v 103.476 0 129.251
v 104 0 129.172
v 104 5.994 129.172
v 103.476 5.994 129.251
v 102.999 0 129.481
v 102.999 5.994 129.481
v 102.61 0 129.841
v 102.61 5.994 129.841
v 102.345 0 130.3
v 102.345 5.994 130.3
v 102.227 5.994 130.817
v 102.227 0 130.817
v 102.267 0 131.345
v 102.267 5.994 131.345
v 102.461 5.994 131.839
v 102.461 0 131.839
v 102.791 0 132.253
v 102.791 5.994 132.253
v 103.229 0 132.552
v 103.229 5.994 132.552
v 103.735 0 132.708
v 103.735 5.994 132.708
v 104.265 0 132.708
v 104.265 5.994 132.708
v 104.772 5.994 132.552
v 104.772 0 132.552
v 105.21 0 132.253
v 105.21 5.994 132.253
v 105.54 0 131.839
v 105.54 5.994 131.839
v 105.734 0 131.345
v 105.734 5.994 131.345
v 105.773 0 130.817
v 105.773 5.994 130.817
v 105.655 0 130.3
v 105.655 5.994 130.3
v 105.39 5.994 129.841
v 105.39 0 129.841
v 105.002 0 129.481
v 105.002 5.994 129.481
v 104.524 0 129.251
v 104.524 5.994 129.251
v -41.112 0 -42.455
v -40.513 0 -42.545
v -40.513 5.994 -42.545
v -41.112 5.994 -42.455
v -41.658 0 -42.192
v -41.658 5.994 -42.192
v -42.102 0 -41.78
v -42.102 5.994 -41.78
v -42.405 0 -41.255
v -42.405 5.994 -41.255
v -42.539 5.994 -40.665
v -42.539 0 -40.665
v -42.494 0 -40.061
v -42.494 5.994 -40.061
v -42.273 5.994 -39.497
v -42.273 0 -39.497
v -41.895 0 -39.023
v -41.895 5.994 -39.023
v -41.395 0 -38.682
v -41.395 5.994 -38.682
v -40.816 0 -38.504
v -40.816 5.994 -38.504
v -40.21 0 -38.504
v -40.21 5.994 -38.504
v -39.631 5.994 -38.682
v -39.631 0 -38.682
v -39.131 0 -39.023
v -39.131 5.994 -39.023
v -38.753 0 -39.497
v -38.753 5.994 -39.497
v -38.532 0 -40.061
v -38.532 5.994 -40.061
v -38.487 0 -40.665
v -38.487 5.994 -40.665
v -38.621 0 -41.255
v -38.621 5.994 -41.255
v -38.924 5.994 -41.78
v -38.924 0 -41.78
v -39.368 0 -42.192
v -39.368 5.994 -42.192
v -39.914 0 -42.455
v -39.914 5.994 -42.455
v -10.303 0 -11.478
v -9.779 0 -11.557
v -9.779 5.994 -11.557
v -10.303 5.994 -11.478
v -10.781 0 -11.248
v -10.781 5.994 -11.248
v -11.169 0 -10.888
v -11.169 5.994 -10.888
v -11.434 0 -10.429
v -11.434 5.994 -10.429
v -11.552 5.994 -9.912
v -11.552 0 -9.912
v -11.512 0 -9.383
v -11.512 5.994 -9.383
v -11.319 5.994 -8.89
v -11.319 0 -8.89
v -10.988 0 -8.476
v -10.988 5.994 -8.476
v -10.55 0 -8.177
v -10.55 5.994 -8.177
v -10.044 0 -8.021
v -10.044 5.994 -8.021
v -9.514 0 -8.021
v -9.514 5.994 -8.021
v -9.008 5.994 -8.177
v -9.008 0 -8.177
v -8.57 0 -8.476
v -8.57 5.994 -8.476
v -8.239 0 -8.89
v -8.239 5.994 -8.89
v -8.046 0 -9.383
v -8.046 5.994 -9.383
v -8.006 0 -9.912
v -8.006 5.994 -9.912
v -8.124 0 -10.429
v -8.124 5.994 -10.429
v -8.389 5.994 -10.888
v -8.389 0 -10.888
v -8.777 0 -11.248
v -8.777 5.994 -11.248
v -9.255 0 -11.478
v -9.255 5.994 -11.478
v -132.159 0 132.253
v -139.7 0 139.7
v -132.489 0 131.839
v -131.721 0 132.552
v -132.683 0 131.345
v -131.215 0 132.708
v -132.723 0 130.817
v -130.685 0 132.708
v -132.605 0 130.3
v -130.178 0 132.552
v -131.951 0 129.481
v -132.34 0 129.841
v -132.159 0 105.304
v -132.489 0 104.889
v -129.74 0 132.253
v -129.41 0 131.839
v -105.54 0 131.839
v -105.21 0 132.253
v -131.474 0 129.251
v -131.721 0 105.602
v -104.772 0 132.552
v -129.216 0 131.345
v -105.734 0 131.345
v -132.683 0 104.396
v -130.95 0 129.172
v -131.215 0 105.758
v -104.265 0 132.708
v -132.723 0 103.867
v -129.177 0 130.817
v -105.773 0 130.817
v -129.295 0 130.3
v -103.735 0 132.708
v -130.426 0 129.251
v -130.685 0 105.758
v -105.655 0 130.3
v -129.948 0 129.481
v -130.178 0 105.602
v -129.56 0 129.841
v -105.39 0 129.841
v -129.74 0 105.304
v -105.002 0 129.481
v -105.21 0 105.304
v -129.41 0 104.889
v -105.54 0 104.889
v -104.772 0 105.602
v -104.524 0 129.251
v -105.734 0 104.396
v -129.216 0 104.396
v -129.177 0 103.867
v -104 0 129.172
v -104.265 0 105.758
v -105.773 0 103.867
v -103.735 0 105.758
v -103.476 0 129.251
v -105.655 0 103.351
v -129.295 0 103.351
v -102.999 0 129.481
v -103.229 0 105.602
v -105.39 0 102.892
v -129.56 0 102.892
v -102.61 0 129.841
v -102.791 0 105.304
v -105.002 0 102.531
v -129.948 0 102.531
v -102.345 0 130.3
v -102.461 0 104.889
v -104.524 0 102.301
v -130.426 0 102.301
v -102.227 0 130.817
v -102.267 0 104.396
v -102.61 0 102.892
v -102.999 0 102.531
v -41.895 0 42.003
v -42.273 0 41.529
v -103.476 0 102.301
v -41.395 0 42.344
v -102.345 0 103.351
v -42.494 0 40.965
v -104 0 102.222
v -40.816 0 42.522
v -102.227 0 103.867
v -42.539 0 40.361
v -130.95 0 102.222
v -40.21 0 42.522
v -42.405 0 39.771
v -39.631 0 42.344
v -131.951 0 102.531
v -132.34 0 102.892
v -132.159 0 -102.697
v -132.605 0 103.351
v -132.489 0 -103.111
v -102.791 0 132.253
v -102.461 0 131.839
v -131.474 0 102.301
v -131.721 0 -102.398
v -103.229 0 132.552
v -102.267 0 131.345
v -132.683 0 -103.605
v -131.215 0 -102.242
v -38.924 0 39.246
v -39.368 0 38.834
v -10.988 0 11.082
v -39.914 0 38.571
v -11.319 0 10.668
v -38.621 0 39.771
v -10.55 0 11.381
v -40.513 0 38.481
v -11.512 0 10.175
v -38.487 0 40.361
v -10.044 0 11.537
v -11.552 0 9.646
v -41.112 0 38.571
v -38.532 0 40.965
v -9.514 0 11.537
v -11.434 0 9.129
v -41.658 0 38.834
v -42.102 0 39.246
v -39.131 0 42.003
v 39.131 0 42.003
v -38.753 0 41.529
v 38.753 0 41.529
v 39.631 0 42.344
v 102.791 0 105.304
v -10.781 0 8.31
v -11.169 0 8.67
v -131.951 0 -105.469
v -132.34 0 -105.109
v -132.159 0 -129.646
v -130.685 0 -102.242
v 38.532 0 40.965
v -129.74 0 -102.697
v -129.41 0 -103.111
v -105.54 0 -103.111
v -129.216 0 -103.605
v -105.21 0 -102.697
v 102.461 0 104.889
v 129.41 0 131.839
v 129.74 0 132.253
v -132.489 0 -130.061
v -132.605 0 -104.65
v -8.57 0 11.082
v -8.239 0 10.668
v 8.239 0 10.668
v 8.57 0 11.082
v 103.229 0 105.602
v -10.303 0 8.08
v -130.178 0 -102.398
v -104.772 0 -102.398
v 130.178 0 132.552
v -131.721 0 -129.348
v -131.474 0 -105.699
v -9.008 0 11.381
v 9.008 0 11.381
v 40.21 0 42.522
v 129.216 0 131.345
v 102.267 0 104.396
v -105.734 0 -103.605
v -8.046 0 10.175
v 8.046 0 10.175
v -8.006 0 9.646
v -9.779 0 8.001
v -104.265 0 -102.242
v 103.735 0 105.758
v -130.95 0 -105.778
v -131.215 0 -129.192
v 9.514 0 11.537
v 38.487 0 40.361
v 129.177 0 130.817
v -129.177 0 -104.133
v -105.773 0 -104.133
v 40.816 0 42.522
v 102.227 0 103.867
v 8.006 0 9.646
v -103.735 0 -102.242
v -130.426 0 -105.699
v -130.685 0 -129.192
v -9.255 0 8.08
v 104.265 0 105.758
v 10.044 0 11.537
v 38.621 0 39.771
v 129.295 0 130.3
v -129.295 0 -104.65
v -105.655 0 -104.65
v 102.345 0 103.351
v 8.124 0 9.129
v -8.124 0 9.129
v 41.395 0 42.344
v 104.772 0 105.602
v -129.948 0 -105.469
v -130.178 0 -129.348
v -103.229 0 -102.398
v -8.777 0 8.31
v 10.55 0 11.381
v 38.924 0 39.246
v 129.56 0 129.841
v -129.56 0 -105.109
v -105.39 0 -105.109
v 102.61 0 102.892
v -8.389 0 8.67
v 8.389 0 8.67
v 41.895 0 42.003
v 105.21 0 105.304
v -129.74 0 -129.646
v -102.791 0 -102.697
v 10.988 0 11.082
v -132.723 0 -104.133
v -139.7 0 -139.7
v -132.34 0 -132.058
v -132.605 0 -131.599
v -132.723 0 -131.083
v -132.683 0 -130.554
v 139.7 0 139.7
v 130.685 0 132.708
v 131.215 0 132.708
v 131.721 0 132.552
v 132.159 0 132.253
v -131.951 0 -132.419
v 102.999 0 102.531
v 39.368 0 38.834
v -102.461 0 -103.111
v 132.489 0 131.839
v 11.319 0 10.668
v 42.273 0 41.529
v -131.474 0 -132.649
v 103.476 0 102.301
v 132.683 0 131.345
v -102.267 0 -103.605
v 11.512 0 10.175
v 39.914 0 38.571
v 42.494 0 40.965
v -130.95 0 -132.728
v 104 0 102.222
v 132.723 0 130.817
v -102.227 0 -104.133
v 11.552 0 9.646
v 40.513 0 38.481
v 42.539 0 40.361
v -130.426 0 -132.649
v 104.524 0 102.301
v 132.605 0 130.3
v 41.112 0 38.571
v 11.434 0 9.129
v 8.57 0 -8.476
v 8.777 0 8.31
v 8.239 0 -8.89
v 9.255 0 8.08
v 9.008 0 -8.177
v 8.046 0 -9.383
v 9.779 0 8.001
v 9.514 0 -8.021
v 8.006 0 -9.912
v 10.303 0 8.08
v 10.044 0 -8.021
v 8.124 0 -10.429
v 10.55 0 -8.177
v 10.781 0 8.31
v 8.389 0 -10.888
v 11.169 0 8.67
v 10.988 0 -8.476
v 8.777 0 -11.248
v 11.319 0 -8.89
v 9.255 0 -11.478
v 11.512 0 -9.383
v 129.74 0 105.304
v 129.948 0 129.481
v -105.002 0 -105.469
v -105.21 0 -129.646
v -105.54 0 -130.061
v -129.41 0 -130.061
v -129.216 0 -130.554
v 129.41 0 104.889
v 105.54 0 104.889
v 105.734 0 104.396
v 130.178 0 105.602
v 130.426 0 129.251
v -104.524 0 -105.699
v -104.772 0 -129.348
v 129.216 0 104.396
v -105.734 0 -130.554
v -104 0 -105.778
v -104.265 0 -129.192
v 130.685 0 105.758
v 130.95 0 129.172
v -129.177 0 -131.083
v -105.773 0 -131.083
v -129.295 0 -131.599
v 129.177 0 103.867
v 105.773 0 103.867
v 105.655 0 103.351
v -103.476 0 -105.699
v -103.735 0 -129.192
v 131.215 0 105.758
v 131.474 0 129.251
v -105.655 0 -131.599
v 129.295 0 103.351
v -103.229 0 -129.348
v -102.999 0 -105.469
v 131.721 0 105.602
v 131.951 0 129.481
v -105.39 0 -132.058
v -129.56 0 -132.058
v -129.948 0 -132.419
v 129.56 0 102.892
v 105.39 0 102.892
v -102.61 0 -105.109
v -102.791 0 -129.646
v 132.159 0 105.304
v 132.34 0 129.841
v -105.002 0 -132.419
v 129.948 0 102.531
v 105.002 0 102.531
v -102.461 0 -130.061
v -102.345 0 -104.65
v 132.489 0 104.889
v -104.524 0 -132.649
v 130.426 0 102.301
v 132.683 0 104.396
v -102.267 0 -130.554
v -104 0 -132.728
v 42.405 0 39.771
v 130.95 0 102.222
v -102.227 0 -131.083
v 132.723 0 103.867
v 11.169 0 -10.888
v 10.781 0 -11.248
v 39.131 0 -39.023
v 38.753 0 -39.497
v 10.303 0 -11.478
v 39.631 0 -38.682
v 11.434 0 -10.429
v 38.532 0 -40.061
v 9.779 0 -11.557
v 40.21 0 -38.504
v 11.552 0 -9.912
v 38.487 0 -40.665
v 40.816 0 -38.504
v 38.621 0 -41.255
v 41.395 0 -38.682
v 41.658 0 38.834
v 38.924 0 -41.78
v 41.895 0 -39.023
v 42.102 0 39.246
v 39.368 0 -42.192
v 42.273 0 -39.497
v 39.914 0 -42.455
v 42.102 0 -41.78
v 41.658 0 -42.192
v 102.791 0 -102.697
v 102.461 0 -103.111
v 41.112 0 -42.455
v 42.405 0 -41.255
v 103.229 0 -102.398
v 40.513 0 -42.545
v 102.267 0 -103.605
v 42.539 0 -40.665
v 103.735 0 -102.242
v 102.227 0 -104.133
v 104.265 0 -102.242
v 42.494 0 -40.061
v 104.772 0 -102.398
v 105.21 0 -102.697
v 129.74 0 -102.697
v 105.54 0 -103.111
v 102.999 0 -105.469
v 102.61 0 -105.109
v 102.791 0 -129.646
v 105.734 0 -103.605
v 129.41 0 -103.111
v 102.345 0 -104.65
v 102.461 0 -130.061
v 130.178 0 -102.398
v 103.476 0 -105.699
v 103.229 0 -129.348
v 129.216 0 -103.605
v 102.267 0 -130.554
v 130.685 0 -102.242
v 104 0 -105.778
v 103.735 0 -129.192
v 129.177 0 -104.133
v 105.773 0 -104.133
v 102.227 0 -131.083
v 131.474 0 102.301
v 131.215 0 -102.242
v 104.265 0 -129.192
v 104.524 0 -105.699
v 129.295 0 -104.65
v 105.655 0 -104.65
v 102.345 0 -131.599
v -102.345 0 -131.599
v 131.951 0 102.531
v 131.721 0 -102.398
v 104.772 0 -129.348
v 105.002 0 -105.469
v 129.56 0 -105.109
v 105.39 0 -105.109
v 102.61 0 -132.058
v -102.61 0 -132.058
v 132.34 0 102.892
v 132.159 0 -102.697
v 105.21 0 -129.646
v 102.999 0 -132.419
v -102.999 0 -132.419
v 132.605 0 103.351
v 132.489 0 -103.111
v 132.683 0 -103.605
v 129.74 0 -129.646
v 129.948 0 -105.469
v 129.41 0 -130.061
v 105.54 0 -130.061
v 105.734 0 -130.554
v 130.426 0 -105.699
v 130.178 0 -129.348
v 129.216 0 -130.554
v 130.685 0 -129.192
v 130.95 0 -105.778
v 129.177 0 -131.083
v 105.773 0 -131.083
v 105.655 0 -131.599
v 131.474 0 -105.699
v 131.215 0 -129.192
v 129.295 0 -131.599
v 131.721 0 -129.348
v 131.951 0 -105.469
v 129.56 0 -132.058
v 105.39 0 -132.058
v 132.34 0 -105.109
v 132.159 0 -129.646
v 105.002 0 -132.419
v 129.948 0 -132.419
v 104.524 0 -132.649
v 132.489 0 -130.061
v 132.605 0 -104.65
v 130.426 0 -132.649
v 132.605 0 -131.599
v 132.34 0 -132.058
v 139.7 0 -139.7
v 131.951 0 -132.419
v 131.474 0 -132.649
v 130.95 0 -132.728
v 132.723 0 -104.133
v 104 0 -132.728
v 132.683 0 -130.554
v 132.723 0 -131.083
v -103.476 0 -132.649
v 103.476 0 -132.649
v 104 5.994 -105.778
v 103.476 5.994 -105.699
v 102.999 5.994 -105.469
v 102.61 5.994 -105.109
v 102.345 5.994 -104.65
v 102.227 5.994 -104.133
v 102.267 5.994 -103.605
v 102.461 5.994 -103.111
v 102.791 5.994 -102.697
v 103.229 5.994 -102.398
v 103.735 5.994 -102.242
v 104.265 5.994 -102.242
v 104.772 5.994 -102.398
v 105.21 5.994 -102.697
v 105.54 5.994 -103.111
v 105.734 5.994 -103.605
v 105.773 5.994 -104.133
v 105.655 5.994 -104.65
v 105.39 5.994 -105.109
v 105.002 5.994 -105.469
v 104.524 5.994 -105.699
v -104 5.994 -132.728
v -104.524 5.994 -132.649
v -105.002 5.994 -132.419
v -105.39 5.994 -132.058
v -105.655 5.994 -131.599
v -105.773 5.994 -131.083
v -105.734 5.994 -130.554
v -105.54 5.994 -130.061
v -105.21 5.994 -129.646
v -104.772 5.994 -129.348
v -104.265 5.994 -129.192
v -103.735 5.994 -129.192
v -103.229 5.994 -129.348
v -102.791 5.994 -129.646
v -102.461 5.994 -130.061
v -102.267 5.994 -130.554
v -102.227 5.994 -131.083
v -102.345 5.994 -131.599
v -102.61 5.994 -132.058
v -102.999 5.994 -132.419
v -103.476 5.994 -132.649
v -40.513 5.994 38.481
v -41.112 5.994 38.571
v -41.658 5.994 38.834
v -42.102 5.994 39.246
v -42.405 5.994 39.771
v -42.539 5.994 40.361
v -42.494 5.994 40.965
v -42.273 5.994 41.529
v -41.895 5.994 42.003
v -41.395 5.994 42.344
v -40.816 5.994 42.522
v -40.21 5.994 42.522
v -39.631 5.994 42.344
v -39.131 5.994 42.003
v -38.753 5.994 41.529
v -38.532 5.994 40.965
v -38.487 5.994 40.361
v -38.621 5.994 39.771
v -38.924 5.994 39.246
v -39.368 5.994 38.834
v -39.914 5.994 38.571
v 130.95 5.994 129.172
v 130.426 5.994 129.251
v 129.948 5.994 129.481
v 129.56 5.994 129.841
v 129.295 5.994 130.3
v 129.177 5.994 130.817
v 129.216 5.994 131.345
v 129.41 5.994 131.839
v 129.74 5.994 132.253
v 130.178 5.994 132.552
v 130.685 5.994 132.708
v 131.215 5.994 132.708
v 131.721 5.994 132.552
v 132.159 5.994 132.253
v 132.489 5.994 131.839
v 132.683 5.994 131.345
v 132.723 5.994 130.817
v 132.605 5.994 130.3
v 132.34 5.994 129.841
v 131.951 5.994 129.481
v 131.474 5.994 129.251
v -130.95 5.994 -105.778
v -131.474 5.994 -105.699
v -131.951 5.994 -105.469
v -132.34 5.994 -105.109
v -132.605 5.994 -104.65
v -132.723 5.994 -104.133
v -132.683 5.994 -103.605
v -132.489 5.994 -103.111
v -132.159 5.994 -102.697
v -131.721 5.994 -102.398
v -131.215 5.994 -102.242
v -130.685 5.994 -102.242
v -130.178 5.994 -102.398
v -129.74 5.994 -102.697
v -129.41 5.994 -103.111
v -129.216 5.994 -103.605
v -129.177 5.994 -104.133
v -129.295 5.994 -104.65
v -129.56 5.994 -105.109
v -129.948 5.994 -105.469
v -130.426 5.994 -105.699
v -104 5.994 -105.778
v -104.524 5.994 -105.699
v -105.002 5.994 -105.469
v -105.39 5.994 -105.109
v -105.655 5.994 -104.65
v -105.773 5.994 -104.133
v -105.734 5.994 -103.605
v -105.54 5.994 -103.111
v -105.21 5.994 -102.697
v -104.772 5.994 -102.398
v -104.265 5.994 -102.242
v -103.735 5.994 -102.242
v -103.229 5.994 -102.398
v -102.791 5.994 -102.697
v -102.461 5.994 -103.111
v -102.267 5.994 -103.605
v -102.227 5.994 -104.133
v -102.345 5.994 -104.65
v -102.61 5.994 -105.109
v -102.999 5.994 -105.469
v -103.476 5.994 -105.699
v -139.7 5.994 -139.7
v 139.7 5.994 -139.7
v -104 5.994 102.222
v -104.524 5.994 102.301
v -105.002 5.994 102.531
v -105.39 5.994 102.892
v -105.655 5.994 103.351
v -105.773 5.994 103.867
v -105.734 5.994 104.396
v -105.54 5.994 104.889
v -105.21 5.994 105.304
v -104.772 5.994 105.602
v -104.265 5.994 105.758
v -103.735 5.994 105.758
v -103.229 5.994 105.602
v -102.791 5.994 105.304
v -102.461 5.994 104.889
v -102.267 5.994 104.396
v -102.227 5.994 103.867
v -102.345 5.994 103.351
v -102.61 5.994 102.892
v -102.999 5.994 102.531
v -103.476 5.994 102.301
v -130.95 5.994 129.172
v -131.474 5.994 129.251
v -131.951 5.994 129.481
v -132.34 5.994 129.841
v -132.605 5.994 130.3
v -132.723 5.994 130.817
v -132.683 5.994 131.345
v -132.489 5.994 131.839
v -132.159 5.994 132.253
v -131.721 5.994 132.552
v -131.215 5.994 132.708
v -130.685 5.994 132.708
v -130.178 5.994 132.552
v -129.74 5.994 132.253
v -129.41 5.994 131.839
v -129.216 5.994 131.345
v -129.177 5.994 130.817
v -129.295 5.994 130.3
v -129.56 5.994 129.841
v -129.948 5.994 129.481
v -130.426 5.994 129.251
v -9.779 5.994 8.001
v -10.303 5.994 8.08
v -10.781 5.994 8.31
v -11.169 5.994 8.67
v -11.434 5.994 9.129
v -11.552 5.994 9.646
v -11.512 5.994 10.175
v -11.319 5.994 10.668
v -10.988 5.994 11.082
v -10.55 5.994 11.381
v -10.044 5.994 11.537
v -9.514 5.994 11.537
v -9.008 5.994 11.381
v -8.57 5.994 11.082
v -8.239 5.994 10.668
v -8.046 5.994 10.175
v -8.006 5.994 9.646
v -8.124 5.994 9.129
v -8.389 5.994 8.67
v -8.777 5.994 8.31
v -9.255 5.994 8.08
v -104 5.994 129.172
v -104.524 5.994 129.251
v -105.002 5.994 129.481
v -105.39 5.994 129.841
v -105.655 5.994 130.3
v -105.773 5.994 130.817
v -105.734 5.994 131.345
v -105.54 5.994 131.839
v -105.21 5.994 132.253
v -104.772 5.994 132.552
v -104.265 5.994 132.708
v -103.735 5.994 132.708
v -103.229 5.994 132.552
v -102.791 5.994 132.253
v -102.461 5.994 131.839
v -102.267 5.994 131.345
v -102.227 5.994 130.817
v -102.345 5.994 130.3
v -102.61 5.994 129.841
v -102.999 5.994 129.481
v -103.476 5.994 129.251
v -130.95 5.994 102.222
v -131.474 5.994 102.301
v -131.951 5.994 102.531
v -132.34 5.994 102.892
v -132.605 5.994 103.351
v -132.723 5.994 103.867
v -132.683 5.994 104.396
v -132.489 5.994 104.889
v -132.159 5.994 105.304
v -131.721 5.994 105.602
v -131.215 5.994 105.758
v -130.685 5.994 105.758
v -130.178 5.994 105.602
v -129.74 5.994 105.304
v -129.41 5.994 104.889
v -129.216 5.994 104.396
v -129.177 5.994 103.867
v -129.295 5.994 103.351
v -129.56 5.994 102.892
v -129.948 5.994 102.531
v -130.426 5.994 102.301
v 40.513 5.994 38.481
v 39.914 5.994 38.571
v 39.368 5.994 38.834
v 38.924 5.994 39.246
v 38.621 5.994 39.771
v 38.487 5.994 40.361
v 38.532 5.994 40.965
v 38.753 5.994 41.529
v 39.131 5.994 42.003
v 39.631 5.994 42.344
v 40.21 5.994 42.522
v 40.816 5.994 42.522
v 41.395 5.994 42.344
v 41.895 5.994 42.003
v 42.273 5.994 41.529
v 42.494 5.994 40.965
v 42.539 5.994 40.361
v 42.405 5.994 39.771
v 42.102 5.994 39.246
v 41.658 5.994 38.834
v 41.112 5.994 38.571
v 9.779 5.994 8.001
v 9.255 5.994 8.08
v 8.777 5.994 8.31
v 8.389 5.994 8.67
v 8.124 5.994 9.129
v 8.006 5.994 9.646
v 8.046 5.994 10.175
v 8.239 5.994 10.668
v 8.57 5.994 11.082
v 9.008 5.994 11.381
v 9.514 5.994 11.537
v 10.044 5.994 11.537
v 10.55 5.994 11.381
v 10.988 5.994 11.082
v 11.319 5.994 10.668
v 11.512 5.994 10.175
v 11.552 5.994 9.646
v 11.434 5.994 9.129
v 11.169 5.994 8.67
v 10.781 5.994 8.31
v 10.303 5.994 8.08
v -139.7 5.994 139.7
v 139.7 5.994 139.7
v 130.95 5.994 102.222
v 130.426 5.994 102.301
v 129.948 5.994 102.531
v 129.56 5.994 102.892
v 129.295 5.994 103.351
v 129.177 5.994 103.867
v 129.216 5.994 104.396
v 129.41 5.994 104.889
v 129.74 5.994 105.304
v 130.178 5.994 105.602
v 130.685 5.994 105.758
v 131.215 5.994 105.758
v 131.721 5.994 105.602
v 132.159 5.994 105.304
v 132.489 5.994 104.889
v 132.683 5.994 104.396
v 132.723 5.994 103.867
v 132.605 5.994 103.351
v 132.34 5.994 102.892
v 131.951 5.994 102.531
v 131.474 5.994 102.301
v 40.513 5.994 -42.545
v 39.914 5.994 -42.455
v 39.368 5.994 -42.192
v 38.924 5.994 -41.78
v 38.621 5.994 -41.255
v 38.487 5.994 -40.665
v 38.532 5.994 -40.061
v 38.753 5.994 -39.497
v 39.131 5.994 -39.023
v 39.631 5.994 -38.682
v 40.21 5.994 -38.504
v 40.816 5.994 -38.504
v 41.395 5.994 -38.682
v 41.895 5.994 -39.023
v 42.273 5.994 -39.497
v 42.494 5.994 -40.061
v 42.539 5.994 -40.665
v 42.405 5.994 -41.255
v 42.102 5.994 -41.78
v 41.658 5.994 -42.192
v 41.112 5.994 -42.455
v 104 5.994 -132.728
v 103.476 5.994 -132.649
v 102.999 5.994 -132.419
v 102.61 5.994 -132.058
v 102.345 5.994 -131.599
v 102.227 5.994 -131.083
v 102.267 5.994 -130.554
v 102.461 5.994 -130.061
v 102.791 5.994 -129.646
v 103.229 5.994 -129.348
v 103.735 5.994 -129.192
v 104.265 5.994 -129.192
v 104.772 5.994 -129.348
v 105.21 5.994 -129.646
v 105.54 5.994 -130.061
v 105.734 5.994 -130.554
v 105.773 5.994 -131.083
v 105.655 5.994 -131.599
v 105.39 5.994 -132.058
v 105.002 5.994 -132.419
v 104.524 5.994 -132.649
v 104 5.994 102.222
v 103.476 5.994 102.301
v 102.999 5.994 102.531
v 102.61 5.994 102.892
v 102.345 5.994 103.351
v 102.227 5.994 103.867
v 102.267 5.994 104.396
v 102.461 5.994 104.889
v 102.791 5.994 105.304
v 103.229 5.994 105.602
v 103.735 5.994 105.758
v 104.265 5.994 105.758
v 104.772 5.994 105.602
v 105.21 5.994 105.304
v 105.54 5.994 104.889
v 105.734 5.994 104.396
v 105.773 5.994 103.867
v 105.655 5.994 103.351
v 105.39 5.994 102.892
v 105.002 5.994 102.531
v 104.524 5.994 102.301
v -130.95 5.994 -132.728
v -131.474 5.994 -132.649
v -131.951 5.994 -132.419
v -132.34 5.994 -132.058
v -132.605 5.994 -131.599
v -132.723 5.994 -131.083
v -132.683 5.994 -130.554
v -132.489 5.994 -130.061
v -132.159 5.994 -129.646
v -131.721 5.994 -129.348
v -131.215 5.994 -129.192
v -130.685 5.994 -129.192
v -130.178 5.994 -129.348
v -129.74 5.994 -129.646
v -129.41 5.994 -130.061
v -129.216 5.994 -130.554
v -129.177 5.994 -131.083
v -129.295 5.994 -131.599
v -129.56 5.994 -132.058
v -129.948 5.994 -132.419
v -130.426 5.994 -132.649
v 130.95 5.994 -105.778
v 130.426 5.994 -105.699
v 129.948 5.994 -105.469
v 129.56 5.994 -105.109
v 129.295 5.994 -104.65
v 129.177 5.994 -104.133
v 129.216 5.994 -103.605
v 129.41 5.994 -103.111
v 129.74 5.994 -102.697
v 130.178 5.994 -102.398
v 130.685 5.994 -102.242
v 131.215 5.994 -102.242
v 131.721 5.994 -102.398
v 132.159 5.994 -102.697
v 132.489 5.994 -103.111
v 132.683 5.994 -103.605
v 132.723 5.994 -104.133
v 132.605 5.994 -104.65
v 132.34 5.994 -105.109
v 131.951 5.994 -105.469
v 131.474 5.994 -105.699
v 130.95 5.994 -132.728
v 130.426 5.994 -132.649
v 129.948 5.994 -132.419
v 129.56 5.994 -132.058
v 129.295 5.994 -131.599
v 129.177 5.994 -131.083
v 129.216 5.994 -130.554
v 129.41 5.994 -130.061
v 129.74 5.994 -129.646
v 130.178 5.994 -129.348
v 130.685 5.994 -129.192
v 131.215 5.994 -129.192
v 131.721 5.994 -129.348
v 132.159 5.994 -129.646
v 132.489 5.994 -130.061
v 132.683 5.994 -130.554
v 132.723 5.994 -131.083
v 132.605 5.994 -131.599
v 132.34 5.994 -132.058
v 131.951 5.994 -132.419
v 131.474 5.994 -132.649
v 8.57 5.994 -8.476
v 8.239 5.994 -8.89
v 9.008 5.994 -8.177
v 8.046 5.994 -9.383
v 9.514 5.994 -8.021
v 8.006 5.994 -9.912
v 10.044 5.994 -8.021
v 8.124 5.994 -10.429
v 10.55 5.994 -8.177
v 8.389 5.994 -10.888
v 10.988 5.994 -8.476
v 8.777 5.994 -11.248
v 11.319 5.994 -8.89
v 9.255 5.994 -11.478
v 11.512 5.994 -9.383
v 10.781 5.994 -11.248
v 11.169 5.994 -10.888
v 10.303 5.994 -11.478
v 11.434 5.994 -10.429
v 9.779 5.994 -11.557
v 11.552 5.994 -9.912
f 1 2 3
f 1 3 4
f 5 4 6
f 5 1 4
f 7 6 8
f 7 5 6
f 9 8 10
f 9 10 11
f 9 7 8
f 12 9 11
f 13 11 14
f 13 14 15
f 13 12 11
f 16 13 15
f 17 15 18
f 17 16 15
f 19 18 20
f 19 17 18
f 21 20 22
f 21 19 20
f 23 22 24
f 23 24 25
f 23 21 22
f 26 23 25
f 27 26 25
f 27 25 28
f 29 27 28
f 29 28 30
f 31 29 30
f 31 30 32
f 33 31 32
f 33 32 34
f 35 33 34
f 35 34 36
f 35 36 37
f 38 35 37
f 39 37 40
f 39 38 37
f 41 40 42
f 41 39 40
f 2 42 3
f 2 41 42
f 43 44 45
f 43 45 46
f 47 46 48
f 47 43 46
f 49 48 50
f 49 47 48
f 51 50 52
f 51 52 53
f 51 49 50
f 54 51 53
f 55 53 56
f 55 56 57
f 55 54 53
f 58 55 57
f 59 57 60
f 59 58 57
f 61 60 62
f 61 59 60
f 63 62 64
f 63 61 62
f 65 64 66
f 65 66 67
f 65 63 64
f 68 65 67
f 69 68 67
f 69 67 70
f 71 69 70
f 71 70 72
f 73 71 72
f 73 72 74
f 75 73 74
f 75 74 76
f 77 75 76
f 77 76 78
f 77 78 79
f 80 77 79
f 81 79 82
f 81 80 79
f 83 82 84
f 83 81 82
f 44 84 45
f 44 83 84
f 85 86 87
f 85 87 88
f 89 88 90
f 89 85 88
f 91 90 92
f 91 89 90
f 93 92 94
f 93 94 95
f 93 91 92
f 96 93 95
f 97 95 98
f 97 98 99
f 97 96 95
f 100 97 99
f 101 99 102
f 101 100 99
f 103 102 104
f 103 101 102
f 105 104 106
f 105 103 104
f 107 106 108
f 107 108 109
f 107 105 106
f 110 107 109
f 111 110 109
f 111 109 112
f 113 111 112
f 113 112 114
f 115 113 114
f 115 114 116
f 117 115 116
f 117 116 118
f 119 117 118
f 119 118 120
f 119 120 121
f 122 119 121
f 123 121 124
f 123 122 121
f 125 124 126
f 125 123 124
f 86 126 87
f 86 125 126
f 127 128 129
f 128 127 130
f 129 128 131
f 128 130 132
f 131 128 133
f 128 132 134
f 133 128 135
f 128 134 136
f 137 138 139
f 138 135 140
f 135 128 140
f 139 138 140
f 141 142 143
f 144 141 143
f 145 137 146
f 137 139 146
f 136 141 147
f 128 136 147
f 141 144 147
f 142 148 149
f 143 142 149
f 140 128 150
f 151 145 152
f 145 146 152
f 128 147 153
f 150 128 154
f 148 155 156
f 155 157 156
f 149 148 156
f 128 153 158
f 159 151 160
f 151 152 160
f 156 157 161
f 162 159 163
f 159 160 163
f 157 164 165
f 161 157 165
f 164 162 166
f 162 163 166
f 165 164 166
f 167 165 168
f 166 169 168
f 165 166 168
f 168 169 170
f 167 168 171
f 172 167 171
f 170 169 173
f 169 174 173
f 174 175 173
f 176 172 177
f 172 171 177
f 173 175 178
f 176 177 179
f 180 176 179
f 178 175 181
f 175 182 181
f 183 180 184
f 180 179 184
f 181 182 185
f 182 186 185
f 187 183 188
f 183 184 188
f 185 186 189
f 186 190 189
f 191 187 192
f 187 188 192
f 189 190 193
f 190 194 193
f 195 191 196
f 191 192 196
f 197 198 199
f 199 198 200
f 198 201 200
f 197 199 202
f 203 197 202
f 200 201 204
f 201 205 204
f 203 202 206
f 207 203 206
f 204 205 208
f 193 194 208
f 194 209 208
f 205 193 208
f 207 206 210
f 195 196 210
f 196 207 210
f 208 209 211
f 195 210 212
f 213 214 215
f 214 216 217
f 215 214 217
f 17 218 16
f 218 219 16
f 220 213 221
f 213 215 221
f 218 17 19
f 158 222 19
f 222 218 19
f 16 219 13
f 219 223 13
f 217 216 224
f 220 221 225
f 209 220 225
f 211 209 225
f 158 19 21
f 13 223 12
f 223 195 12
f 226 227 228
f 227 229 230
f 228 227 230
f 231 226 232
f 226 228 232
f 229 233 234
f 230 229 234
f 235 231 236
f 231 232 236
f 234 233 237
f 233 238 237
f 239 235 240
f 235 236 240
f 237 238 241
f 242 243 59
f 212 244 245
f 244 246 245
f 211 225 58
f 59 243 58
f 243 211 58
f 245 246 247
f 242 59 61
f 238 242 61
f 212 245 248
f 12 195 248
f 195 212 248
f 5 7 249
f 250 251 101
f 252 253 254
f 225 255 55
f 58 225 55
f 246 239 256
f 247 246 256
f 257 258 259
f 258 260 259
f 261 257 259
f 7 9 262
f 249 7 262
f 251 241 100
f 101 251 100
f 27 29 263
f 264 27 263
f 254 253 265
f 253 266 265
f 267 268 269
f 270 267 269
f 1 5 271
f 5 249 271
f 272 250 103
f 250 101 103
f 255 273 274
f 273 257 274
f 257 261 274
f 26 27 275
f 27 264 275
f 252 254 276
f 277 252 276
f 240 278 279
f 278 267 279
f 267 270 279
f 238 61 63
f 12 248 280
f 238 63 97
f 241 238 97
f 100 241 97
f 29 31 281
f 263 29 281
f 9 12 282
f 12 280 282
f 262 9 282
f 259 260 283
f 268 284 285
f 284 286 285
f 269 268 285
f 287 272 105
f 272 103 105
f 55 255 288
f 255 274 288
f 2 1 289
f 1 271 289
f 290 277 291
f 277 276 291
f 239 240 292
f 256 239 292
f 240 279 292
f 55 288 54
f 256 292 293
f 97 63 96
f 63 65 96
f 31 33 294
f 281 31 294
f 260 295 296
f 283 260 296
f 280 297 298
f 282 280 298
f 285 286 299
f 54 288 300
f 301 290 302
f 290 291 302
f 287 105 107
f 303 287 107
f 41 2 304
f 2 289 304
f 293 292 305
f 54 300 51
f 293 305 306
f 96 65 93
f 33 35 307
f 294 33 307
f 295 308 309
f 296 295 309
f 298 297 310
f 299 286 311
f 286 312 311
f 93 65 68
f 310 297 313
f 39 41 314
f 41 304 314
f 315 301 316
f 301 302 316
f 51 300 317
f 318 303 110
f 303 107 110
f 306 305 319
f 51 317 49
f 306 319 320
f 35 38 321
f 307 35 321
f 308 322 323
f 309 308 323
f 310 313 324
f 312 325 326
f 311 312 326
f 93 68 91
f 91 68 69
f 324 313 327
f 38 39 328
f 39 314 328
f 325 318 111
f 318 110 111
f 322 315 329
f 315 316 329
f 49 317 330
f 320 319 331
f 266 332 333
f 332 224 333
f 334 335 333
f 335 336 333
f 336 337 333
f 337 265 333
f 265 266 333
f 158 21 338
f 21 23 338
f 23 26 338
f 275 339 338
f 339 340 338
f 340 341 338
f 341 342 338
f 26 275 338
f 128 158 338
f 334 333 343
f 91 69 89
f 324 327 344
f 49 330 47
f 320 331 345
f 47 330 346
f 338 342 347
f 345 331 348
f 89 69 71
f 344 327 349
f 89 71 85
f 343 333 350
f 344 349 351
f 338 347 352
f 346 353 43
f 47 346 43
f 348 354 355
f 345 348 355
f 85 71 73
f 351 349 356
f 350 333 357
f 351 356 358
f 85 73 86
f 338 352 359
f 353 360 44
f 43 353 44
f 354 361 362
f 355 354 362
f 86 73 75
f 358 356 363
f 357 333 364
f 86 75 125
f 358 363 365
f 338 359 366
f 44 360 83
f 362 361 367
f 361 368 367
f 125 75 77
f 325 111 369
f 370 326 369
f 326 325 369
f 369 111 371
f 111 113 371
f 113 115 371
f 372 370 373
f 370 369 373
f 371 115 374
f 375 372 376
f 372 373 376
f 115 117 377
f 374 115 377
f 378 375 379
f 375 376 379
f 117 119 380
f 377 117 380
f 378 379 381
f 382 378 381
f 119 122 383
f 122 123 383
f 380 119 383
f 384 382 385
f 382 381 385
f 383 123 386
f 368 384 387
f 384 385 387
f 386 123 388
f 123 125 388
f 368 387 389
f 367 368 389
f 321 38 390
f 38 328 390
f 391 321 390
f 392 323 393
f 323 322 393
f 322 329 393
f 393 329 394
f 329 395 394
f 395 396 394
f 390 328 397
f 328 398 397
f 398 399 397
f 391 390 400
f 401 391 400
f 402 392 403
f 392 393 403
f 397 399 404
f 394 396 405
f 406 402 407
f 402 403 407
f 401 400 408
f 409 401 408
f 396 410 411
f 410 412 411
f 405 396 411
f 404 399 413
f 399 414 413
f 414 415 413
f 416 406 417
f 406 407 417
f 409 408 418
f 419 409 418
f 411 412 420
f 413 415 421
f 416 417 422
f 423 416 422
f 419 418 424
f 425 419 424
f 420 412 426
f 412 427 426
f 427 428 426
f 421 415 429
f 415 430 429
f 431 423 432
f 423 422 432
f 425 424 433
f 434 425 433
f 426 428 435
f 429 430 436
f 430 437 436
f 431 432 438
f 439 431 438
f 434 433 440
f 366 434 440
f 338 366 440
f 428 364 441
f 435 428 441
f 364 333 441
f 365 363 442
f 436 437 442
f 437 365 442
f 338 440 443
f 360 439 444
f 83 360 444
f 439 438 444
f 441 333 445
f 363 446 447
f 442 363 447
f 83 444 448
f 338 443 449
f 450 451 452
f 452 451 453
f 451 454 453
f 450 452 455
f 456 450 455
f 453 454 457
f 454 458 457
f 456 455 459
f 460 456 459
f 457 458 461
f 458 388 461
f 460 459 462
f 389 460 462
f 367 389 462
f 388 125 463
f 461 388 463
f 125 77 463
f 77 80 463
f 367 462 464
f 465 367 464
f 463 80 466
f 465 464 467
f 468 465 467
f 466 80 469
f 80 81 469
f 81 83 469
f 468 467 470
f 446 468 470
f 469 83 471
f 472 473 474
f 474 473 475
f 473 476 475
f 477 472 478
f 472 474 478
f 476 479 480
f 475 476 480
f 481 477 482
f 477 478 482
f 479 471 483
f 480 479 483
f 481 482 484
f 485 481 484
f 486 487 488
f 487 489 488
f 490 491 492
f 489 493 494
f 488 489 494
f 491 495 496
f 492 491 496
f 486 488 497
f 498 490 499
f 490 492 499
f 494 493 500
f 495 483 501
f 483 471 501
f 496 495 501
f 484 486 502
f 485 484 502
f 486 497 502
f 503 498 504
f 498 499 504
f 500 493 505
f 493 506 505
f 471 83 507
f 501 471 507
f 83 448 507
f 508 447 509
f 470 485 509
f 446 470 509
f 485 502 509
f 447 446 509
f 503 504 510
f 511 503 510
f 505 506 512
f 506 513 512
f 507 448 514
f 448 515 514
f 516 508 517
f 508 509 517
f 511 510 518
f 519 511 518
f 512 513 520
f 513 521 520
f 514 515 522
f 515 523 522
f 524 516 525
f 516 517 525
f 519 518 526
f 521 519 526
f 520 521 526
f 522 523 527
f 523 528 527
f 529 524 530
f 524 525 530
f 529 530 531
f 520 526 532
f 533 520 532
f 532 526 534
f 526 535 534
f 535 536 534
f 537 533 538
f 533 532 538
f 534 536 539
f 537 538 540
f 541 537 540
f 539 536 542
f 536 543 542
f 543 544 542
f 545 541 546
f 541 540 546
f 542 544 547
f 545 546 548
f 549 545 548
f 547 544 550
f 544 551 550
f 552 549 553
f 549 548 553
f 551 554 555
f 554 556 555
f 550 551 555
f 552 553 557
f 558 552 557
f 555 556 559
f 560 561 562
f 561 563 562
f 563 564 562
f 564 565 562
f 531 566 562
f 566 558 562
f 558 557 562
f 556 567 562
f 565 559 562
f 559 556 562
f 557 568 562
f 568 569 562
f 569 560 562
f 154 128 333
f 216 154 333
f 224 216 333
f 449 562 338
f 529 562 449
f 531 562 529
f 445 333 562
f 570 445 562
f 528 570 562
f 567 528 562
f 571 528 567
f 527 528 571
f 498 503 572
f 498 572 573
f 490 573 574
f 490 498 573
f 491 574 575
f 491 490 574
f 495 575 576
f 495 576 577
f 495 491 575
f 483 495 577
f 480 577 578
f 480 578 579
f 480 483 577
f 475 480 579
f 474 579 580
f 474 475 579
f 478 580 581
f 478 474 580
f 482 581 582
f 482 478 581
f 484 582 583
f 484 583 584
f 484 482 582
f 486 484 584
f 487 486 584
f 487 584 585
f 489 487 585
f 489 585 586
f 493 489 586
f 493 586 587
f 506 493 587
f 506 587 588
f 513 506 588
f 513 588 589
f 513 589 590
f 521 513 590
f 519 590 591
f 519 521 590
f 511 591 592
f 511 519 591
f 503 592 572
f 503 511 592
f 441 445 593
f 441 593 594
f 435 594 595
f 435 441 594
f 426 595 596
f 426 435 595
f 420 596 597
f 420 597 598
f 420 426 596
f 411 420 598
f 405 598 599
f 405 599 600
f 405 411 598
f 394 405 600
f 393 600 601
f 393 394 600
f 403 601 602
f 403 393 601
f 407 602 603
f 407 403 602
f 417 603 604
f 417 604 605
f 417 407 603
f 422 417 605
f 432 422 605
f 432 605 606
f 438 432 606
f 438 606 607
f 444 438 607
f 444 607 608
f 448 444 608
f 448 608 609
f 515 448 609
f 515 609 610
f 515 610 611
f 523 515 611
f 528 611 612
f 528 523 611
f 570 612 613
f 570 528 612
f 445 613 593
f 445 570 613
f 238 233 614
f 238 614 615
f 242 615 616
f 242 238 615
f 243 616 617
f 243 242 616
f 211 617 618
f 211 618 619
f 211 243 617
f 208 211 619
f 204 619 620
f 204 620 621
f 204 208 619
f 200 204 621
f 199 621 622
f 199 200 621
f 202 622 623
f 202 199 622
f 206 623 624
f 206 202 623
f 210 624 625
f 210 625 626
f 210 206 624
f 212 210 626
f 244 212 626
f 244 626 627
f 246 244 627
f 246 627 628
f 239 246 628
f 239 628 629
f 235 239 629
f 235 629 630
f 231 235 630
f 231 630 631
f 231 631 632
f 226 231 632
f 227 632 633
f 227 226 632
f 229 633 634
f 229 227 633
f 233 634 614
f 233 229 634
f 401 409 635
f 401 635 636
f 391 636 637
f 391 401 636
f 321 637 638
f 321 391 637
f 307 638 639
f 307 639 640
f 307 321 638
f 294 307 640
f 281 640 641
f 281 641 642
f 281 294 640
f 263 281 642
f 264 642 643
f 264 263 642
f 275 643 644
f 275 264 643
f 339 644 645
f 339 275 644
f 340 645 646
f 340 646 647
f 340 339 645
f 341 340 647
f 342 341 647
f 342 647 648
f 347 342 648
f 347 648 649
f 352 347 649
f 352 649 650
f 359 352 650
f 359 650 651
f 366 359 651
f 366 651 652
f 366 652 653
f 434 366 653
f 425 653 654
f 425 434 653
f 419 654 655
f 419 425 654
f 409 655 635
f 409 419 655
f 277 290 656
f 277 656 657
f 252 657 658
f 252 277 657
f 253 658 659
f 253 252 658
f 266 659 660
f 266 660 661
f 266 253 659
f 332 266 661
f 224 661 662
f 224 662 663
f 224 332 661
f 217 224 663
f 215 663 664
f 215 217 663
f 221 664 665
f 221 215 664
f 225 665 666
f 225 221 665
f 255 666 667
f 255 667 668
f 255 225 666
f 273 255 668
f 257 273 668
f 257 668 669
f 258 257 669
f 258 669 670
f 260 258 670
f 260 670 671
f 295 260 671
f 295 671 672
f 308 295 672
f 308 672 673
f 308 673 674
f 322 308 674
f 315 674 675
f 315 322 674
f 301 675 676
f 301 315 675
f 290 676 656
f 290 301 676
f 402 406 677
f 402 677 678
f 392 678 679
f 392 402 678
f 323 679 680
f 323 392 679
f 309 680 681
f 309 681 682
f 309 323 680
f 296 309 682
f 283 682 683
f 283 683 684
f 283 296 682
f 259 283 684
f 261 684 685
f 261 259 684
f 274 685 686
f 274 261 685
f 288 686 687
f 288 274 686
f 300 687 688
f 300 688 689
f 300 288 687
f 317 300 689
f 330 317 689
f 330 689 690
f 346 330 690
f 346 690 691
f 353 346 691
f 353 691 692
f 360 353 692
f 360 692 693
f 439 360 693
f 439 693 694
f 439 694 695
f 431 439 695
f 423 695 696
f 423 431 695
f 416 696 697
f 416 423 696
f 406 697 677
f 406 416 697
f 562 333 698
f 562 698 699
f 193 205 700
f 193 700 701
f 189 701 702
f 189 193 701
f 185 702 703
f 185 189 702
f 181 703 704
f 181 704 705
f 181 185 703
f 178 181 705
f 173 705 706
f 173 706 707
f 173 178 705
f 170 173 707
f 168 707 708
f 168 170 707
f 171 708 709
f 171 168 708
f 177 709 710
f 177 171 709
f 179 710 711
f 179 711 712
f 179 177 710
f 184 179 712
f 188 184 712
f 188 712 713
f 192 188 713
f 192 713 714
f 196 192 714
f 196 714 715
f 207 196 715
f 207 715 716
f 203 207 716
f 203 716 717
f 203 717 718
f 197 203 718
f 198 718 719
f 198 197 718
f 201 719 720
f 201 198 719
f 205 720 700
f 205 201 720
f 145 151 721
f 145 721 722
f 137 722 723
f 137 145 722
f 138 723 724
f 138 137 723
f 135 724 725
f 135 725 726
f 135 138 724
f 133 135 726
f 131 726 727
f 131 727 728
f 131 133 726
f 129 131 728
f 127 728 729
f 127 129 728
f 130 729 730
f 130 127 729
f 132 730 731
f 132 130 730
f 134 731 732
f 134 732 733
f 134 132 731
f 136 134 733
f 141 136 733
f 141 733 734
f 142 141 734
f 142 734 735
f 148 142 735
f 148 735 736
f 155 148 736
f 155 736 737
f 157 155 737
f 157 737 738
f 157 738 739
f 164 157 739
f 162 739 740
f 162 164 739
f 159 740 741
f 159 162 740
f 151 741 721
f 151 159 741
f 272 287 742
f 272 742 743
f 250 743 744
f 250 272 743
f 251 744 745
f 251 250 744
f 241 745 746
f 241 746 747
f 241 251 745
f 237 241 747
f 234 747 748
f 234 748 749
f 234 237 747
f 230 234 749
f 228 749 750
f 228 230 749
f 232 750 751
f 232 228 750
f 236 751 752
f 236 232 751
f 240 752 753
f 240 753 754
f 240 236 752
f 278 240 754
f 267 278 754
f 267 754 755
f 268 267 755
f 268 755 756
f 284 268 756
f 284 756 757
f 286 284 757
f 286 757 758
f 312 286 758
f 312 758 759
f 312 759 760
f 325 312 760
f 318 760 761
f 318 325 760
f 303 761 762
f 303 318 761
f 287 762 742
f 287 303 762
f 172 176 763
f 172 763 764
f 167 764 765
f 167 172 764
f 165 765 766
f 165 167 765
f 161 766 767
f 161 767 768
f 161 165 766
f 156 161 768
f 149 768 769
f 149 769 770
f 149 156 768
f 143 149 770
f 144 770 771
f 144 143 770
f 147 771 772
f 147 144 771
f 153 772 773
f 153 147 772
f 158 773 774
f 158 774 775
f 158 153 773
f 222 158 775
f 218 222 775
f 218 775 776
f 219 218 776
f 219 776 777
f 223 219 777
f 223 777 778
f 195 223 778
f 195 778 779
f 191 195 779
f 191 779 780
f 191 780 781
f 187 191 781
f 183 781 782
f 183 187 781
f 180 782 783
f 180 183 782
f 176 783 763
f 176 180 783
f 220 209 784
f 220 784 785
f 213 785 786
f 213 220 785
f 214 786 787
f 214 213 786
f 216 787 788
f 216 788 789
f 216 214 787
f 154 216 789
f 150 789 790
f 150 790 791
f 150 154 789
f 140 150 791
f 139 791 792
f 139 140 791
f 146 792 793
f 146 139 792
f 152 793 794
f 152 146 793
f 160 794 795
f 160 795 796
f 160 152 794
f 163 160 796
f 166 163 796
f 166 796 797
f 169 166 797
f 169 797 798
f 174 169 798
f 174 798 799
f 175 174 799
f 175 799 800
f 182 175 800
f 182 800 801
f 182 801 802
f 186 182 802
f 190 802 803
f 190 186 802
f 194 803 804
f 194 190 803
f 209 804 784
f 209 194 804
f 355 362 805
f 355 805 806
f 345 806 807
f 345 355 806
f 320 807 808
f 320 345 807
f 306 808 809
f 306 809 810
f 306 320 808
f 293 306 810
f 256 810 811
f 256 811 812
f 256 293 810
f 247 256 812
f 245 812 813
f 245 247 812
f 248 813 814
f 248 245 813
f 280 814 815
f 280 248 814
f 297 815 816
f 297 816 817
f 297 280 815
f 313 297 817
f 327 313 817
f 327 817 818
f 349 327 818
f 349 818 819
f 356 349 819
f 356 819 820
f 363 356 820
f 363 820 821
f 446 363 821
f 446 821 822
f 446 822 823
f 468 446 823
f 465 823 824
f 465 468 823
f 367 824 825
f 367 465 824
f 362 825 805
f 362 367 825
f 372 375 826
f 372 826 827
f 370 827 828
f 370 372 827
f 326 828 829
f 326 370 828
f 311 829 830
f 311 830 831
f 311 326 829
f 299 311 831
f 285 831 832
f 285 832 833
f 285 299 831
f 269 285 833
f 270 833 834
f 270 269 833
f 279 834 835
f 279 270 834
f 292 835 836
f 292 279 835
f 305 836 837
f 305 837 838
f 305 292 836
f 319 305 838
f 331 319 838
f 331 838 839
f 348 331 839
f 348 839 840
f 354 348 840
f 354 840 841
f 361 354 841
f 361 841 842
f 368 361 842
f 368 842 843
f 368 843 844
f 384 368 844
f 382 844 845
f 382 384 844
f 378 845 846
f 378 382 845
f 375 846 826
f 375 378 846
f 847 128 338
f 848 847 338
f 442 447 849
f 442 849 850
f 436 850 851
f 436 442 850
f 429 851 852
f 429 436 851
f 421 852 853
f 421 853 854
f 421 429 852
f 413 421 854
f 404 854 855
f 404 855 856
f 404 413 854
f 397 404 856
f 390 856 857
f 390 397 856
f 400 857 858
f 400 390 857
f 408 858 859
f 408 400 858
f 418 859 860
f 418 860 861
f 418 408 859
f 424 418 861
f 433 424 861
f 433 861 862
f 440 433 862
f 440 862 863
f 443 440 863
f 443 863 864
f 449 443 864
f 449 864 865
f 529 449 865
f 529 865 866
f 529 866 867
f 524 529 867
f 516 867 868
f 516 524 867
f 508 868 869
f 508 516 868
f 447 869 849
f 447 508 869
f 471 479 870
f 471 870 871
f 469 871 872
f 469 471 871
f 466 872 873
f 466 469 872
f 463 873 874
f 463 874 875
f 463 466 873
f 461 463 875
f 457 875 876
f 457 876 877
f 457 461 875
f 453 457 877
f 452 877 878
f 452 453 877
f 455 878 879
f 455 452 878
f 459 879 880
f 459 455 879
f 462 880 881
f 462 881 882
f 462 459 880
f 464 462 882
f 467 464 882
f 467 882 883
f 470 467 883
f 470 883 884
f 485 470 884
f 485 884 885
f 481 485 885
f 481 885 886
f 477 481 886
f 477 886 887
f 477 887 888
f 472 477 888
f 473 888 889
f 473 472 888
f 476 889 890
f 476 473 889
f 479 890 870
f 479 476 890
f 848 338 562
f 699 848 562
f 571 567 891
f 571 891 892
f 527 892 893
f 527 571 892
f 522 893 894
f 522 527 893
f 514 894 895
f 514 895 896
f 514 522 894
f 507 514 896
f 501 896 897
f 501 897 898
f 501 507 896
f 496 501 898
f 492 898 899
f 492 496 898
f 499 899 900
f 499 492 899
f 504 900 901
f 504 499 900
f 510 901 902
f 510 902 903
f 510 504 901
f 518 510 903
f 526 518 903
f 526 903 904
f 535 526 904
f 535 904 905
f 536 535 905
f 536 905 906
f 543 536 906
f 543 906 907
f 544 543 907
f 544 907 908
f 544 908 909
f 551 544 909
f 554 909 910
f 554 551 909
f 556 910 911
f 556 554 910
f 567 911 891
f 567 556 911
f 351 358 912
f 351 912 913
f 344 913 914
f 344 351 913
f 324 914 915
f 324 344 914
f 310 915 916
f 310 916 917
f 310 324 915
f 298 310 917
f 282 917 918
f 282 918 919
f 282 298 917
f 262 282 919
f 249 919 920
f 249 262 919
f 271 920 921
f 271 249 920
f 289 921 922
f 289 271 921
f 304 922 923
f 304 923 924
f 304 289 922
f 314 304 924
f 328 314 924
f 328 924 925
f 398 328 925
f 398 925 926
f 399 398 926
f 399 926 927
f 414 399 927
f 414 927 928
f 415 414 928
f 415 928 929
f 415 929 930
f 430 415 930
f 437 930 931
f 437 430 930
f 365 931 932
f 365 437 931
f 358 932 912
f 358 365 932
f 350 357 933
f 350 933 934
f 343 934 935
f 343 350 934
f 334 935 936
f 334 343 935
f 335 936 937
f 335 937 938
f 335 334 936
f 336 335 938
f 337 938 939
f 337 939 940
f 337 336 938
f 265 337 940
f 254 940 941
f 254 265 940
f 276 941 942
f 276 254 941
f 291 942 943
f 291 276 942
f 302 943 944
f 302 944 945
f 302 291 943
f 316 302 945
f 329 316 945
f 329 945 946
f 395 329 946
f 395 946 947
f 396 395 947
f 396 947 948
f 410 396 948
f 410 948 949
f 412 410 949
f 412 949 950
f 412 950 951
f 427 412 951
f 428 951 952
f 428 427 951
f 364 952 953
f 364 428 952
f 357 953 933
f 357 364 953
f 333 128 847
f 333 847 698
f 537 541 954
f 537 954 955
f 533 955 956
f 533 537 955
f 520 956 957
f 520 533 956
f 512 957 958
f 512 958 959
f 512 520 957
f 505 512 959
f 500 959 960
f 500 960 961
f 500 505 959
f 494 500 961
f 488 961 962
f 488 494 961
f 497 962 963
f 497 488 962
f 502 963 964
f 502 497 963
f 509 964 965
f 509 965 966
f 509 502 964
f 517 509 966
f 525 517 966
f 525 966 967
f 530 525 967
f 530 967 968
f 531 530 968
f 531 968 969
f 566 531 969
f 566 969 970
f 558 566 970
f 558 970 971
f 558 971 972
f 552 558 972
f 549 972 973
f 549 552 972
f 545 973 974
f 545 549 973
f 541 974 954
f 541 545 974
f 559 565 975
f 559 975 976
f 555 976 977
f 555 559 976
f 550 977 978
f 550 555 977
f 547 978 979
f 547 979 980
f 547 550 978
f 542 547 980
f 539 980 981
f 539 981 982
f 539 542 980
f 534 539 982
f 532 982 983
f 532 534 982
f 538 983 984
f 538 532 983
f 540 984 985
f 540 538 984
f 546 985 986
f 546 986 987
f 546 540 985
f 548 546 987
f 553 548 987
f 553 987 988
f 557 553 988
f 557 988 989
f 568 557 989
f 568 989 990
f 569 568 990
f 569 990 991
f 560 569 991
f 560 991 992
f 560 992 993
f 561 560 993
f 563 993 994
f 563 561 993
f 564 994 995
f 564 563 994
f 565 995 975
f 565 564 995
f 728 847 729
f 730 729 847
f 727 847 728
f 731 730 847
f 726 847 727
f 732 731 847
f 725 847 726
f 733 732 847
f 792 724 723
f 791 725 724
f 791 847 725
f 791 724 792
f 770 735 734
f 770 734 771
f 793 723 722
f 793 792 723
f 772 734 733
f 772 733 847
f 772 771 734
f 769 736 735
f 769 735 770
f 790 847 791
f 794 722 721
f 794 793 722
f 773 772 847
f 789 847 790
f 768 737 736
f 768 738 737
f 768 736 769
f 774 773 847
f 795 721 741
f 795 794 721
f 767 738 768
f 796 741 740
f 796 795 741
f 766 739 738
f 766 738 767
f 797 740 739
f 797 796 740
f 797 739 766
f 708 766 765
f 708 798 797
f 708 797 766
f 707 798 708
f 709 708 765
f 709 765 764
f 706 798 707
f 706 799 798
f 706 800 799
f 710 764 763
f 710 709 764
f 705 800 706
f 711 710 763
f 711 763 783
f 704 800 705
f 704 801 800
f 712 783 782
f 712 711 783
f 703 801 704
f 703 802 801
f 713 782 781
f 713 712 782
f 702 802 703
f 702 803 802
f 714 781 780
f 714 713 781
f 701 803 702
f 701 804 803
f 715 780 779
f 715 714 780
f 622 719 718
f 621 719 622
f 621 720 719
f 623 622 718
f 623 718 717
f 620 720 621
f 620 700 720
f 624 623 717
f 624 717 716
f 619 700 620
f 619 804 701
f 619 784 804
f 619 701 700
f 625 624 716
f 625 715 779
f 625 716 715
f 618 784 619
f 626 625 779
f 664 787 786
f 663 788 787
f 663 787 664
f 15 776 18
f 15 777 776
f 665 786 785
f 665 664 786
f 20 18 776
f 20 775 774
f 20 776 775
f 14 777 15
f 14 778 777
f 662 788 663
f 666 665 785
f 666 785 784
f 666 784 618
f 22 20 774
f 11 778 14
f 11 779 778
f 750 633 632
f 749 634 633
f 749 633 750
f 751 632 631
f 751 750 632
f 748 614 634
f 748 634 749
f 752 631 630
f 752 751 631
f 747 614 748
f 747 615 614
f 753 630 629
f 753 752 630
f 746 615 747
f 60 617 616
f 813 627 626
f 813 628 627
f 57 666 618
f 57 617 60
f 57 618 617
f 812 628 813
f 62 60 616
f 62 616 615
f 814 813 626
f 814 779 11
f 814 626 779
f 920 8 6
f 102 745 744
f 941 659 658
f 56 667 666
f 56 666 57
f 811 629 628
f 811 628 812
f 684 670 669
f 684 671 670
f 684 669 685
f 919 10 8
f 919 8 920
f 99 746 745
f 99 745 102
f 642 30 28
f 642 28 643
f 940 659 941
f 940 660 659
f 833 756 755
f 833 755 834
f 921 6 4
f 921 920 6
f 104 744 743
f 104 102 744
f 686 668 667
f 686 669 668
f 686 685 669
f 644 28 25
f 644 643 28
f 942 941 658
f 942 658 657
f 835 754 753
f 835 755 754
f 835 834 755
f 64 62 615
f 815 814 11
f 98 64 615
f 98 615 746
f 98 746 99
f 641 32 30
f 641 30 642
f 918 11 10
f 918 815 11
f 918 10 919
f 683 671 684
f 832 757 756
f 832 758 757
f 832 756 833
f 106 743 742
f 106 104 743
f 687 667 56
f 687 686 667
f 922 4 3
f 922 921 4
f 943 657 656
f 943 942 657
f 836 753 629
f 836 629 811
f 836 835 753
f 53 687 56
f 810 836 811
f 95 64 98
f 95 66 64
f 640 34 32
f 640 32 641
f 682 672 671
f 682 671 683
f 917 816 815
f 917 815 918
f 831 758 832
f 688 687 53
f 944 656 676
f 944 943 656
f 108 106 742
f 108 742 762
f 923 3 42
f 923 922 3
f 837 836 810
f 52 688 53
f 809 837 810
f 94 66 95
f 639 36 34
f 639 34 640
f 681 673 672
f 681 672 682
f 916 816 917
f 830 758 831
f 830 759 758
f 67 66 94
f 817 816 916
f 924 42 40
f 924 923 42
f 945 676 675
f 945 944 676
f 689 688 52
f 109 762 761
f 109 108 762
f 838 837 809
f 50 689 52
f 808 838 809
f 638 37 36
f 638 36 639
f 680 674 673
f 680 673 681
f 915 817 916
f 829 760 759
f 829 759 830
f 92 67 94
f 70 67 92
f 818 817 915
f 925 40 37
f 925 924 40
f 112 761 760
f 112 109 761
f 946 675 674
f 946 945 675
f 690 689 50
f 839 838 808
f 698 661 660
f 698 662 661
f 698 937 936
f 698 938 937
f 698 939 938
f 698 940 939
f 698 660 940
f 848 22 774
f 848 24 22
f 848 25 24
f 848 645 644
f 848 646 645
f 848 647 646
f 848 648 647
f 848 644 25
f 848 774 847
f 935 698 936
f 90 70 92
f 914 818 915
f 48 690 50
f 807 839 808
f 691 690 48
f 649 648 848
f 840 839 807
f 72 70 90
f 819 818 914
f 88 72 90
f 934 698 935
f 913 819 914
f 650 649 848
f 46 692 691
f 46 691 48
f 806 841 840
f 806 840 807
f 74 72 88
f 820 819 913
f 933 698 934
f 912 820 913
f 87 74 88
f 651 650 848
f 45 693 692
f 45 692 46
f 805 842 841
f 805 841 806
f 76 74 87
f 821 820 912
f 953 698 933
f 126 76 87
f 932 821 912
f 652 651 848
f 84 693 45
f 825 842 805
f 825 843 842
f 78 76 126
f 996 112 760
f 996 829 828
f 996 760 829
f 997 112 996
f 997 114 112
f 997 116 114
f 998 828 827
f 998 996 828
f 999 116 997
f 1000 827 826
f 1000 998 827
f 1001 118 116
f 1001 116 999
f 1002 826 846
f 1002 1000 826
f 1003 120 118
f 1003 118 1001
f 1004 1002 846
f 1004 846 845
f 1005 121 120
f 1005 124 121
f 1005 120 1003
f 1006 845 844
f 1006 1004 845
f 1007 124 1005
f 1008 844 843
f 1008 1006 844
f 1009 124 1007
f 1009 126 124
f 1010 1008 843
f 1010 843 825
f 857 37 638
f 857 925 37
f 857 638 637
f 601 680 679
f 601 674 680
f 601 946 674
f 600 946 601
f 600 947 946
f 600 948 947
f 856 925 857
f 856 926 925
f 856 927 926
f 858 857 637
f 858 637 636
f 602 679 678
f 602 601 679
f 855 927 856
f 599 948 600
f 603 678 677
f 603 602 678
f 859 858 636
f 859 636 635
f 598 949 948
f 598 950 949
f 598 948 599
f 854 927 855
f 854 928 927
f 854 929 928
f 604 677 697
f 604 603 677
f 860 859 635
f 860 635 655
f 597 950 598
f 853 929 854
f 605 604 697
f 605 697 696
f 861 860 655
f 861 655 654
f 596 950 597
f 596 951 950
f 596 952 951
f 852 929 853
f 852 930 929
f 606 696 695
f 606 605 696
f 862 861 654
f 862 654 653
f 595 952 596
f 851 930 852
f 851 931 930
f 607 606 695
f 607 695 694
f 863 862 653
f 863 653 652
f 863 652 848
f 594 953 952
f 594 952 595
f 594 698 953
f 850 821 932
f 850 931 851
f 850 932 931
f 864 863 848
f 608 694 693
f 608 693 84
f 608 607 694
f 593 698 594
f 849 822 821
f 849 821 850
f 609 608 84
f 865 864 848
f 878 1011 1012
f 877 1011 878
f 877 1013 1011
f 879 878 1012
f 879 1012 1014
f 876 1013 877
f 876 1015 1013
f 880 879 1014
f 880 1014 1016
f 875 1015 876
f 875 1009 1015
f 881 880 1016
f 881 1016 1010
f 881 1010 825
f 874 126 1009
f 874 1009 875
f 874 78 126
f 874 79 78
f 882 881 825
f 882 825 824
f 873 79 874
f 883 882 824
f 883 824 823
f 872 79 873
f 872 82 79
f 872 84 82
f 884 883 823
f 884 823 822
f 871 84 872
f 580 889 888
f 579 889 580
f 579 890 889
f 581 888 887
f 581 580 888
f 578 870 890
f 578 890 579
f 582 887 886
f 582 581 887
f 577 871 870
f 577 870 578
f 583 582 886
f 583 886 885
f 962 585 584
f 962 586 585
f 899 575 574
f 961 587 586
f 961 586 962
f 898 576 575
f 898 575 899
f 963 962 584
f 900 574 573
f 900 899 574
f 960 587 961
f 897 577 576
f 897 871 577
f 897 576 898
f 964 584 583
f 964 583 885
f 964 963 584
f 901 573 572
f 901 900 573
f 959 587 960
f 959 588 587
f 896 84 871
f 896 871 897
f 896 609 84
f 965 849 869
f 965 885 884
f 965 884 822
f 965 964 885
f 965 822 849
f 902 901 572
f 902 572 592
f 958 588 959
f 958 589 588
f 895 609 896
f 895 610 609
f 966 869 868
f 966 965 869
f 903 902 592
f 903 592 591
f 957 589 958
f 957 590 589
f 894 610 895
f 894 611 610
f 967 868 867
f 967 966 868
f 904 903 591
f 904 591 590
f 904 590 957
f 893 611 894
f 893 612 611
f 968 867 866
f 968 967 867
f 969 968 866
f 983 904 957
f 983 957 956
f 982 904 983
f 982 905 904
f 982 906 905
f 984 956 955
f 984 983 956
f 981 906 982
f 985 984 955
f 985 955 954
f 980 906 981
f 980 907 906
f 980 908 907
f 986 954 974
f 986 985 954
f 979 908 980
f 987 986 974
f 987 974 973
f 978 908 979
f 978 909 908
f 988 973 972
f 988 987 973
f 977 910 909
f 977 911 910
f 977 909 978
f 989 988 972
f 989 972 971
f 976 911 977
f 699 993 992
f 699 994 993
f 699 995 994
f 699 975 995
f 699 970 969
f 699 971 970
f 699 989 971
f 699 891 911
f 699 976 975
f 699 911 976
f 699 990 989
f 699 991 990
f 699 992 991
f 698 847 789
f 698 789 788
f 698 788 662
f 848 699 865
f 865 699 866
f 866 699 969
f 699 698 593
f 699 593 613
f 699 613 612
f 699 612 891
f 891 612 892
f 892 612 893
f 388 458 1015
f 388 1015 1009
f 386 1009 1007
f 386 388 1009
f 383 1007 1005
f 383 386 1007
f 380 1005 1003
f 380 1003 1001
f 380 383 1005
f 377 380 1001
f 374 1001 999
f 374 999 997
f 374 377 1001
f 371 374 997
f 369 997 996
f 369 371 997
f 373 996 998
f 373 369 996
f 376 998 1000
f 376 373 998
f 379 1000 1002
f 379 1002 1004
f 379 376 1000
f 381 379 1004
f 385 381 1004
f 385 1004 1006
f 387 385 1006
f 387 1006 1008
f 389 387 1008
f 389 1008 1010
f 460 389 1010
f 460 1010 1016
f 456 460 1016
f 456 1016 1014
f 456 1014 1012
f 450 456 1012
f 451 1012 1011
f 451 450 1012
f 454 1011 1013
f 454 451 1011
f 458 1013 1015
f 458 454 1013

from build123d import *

# Parameters (mm, degrees)
SKETCH1_W           = 279.4
SKETCH1_H           = 279.4
SKETCH1_R           = 1.778
SKETCH1_R_2         = 2.032
BOSS_EXTRUDE1_DEPTH = 5.9944


with BuildPart() as part:
    # Sketch1 → Boss-Extrude1 (new body)
    with BuildSketch(Plane(origin=(0, 0, 0), x_dir=(1, 0, 0), z_dir=(0, 1, 0))):
        Rectangle(SKETCH1_W, SKETCH1_H)
        with Locations(Location((-130.9497, -130.9497, 0), (0, 0, 90))):
            Circle(SKETCH1_R, mode=Mode.SUBTRACT)
        with Locations(Location((-104.0003, -130.9497, 0), (0, 0, 90))):
            Circle(SKETCH1_R, mode=Mode.SUBTRACT)
        with Locations(Location((-130.9497, -104.0003, 0), (0, 0, 90))):
            Circle(SKETCH1_R, mode=Mode.SUBTRACT)
        with Locations(Location((-104.0003, -104.0003, 0), (0, 0, 90))):
            Circle(SKETCH1_R, mode=Mode.SUBTRACT)
        with Locations(Location((104.0003, -130.9497, 0), (0, 0, 90))):
            Circle(SKETCH1_R, mode=Mode.SUBTRACT)
        with Locations(Location((130.9497, -130.9497, 0), (0, 0, 90))):
            Circle(SKETCH1_R, mode=Mode.SUBTRACT)
        with Locations(Location((104.0003, -104.0003, 0), (0, 0, 90))):
            Circle(SKETCH1_R, mode=Mode.SUBTRACT)
        with Locations(Location((130.9497, -104.0003, 0), (0, 0, 90))):
            Circle(SKETCH1_R, mode=Mode.SUBTRACT)
        with Locations(Location((104.0003, 104.0003, 0), (0, 0, 90))):
            Circle(SKETCH1_R, mode=Mode.SUBTRACT)
        with Locations(Location((130.9497, 104.0003, 0), (0, 0, 90))):
            Circle(SKETCH1_R, mode=Mode.SUBTRACT)
        with Locations(Location((104.0003, 130.9497, 0), (0, 0, 90))):
            Circle(SKETCH1_R, mode=Mode.SUBTRACT)
        with Locations(Location((130.9497, 130.9497, 0), (0, 0, 90))):
            Circle(SKETCH1_R, mode=Mode.SUBTRACT)
        with Locations(Location((-130.9497, 104.0003, 0), (0, 0, 90))):
            Circle(SKETCH1_R, mode=Mode.SUBTRACT)
        with Locations(Location((-104.0003, 104.0003, 0), (0, 0, 90))):
            Circle(SKETCH1_R, mode=Mode.SUBTRACT)
        with Locations(Location((-130.9497, 130.9497, 0), (0, 0, 90))):
            Circle(SKETCH1_R, mode=Mode.SUBTRACT)
        with Locations(Location((-104.0003, 130.9497, 0), (0, 0, 90))):
            Circle(SKETCH1_R, mode=Mode.SUBTRACT)
        with Locations(Location((-9.779, -9.779, 0), (0, 0, 90))):
            Circle(SKETCH1_R, mode=Mode.SUBTRACT)
        with Locations(Location((-40.513, 40.513, 0), (0, 0, 90))):
            Circle(SKETCH1_R_2, mode=Mode.SUBTRACT)
        with Locations(Location((40.513, 40.513, 0), (0, 0, 90))):
            Circle(SKETCH1_R_2, mode=Mode.SUBTRACT)
        with Locations(Location((-40.513, -40.513, 0), (0, 0, 90))):
            Circle(SKETCH1_R_2, mode=Mode.SUBTRACT)
        with Locations(Location((40.513, -40.513, 0), (0, 0, 90))):
            Circle(SKETCH1_R_2, mode=Mode.SUBTRACT)
        with Locations(Location((9.779, -9.779, 0), (0, 0, 90))):
            Circle(SKETCH1_R, mode=Mode.SUBTRACT)
        with Locations(Location((-9.779, 9.779, 0), (0, 0, 90))):
            Circle(SKETCH1_R, mode=Mode.SUBTRACT)
        with Locations(Location((9.779, 9.779, 0), (0, 0, 90))):
            Circle(SKETCH1_R, mode=Mode.SUBTRACT)
    extrude(amount=BOSS_EXTRUDE1_DEPTH)


solid = part.part
